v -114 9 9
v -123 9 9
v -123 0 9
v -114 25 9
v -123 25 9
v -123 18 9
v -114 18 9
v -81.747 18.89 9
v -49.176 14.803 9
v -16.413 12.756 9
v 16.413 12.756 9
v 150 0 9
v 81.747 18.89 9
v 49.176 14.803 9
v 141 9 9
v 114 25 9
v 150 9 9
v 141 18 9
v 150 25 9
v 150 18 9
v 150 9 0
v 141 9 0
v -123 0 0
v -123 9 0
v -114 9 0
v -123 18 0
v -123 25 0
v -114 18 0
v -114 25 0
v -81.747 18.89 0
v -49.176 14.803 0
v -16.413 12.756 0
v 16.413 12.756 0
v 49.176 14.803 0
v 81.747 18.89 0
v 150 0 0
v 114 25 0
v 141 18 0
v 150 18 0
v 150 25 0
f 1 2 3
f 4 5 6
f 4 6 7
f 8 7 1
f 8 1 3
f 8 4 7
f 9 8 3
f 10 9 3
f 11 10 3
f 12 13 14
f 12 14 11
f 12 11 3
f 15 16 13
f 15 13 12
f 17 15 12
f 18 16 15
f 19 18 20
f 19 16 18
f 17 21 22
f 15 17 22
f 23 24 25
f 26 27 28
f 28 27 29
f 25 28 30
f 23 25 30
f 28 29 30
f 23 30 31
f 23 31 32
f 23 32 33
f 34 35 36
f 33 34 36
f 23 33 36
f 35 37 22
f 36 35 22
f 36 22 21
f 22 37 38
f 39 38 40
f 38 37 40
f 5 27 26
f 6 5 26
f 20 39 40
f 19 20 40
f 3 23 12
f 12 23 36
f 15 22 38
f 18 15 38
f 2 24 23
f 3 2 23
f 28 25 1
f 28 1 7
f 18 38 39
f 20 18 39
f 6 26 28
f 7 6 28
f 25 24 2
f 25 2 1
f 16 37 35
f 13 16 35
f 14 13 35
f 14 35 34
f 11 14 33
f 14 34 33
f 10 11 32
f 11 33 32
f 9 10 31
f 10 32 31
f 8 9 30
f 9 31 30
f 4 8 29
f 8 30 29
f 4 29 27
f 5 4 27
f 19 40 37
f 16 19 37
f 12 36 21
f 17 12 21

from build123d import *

# Parameters (mm, degrees)
BOSS_EXTRUDE2_DEPTH = 9
SKETCH2_W           = 9
SKETCH2_H           = 9
CUT_EXTRUDE1_DEPTH  = 126.837196409
BOSS_EXTRUDE3_DEPTH = 9


with BuildPart() as part:
    # Sketch1 → Boss-Extrude2 (new body)
    with BuildSketch(Plane.XY):
        with BuildLine():
            Line((-123, 25), (-123, 0))
            Line((-123, 0), (123, 0))
            Line((123, 0), (123, 25))
            Line((123, 25), (114, 25))
            ThreePointArc((114, 25), (0, 12.5), (-114, 25))
            Line((-114, 25), (-123, 25))
        make_face()
    extrude(amount=BOSS_EXTRUDE2_DEPTH)

    # Sketch2 → Cut-Extrude1 (cut, through all)
    with BuildSketch(Plane.XY):
        with Locations((118.5, 13.5)):
            Rectangle(SKETCH2_W, SKETCH2_H)
        with Locations((-118.5, 13.5)):
            Rectangle(SKETCH2_W, SKETCH2_H)
    extrude(amount=CUT_EXTRUDE1_DEPTH, mode=Mode.SUBTRACT)

    # Sketch3 → Boss-Extrude3 (add)
    with BuildSketch(Plane.XY):
        Polygon((114, 25), (114, 0), (150, 0), (150, 9), (141, 9), (141, 18), (150, 18), (150, 25), align=None)
    extrude(amount=BOSS_EXTRUDE3_DEPTH)


solid = part.part
